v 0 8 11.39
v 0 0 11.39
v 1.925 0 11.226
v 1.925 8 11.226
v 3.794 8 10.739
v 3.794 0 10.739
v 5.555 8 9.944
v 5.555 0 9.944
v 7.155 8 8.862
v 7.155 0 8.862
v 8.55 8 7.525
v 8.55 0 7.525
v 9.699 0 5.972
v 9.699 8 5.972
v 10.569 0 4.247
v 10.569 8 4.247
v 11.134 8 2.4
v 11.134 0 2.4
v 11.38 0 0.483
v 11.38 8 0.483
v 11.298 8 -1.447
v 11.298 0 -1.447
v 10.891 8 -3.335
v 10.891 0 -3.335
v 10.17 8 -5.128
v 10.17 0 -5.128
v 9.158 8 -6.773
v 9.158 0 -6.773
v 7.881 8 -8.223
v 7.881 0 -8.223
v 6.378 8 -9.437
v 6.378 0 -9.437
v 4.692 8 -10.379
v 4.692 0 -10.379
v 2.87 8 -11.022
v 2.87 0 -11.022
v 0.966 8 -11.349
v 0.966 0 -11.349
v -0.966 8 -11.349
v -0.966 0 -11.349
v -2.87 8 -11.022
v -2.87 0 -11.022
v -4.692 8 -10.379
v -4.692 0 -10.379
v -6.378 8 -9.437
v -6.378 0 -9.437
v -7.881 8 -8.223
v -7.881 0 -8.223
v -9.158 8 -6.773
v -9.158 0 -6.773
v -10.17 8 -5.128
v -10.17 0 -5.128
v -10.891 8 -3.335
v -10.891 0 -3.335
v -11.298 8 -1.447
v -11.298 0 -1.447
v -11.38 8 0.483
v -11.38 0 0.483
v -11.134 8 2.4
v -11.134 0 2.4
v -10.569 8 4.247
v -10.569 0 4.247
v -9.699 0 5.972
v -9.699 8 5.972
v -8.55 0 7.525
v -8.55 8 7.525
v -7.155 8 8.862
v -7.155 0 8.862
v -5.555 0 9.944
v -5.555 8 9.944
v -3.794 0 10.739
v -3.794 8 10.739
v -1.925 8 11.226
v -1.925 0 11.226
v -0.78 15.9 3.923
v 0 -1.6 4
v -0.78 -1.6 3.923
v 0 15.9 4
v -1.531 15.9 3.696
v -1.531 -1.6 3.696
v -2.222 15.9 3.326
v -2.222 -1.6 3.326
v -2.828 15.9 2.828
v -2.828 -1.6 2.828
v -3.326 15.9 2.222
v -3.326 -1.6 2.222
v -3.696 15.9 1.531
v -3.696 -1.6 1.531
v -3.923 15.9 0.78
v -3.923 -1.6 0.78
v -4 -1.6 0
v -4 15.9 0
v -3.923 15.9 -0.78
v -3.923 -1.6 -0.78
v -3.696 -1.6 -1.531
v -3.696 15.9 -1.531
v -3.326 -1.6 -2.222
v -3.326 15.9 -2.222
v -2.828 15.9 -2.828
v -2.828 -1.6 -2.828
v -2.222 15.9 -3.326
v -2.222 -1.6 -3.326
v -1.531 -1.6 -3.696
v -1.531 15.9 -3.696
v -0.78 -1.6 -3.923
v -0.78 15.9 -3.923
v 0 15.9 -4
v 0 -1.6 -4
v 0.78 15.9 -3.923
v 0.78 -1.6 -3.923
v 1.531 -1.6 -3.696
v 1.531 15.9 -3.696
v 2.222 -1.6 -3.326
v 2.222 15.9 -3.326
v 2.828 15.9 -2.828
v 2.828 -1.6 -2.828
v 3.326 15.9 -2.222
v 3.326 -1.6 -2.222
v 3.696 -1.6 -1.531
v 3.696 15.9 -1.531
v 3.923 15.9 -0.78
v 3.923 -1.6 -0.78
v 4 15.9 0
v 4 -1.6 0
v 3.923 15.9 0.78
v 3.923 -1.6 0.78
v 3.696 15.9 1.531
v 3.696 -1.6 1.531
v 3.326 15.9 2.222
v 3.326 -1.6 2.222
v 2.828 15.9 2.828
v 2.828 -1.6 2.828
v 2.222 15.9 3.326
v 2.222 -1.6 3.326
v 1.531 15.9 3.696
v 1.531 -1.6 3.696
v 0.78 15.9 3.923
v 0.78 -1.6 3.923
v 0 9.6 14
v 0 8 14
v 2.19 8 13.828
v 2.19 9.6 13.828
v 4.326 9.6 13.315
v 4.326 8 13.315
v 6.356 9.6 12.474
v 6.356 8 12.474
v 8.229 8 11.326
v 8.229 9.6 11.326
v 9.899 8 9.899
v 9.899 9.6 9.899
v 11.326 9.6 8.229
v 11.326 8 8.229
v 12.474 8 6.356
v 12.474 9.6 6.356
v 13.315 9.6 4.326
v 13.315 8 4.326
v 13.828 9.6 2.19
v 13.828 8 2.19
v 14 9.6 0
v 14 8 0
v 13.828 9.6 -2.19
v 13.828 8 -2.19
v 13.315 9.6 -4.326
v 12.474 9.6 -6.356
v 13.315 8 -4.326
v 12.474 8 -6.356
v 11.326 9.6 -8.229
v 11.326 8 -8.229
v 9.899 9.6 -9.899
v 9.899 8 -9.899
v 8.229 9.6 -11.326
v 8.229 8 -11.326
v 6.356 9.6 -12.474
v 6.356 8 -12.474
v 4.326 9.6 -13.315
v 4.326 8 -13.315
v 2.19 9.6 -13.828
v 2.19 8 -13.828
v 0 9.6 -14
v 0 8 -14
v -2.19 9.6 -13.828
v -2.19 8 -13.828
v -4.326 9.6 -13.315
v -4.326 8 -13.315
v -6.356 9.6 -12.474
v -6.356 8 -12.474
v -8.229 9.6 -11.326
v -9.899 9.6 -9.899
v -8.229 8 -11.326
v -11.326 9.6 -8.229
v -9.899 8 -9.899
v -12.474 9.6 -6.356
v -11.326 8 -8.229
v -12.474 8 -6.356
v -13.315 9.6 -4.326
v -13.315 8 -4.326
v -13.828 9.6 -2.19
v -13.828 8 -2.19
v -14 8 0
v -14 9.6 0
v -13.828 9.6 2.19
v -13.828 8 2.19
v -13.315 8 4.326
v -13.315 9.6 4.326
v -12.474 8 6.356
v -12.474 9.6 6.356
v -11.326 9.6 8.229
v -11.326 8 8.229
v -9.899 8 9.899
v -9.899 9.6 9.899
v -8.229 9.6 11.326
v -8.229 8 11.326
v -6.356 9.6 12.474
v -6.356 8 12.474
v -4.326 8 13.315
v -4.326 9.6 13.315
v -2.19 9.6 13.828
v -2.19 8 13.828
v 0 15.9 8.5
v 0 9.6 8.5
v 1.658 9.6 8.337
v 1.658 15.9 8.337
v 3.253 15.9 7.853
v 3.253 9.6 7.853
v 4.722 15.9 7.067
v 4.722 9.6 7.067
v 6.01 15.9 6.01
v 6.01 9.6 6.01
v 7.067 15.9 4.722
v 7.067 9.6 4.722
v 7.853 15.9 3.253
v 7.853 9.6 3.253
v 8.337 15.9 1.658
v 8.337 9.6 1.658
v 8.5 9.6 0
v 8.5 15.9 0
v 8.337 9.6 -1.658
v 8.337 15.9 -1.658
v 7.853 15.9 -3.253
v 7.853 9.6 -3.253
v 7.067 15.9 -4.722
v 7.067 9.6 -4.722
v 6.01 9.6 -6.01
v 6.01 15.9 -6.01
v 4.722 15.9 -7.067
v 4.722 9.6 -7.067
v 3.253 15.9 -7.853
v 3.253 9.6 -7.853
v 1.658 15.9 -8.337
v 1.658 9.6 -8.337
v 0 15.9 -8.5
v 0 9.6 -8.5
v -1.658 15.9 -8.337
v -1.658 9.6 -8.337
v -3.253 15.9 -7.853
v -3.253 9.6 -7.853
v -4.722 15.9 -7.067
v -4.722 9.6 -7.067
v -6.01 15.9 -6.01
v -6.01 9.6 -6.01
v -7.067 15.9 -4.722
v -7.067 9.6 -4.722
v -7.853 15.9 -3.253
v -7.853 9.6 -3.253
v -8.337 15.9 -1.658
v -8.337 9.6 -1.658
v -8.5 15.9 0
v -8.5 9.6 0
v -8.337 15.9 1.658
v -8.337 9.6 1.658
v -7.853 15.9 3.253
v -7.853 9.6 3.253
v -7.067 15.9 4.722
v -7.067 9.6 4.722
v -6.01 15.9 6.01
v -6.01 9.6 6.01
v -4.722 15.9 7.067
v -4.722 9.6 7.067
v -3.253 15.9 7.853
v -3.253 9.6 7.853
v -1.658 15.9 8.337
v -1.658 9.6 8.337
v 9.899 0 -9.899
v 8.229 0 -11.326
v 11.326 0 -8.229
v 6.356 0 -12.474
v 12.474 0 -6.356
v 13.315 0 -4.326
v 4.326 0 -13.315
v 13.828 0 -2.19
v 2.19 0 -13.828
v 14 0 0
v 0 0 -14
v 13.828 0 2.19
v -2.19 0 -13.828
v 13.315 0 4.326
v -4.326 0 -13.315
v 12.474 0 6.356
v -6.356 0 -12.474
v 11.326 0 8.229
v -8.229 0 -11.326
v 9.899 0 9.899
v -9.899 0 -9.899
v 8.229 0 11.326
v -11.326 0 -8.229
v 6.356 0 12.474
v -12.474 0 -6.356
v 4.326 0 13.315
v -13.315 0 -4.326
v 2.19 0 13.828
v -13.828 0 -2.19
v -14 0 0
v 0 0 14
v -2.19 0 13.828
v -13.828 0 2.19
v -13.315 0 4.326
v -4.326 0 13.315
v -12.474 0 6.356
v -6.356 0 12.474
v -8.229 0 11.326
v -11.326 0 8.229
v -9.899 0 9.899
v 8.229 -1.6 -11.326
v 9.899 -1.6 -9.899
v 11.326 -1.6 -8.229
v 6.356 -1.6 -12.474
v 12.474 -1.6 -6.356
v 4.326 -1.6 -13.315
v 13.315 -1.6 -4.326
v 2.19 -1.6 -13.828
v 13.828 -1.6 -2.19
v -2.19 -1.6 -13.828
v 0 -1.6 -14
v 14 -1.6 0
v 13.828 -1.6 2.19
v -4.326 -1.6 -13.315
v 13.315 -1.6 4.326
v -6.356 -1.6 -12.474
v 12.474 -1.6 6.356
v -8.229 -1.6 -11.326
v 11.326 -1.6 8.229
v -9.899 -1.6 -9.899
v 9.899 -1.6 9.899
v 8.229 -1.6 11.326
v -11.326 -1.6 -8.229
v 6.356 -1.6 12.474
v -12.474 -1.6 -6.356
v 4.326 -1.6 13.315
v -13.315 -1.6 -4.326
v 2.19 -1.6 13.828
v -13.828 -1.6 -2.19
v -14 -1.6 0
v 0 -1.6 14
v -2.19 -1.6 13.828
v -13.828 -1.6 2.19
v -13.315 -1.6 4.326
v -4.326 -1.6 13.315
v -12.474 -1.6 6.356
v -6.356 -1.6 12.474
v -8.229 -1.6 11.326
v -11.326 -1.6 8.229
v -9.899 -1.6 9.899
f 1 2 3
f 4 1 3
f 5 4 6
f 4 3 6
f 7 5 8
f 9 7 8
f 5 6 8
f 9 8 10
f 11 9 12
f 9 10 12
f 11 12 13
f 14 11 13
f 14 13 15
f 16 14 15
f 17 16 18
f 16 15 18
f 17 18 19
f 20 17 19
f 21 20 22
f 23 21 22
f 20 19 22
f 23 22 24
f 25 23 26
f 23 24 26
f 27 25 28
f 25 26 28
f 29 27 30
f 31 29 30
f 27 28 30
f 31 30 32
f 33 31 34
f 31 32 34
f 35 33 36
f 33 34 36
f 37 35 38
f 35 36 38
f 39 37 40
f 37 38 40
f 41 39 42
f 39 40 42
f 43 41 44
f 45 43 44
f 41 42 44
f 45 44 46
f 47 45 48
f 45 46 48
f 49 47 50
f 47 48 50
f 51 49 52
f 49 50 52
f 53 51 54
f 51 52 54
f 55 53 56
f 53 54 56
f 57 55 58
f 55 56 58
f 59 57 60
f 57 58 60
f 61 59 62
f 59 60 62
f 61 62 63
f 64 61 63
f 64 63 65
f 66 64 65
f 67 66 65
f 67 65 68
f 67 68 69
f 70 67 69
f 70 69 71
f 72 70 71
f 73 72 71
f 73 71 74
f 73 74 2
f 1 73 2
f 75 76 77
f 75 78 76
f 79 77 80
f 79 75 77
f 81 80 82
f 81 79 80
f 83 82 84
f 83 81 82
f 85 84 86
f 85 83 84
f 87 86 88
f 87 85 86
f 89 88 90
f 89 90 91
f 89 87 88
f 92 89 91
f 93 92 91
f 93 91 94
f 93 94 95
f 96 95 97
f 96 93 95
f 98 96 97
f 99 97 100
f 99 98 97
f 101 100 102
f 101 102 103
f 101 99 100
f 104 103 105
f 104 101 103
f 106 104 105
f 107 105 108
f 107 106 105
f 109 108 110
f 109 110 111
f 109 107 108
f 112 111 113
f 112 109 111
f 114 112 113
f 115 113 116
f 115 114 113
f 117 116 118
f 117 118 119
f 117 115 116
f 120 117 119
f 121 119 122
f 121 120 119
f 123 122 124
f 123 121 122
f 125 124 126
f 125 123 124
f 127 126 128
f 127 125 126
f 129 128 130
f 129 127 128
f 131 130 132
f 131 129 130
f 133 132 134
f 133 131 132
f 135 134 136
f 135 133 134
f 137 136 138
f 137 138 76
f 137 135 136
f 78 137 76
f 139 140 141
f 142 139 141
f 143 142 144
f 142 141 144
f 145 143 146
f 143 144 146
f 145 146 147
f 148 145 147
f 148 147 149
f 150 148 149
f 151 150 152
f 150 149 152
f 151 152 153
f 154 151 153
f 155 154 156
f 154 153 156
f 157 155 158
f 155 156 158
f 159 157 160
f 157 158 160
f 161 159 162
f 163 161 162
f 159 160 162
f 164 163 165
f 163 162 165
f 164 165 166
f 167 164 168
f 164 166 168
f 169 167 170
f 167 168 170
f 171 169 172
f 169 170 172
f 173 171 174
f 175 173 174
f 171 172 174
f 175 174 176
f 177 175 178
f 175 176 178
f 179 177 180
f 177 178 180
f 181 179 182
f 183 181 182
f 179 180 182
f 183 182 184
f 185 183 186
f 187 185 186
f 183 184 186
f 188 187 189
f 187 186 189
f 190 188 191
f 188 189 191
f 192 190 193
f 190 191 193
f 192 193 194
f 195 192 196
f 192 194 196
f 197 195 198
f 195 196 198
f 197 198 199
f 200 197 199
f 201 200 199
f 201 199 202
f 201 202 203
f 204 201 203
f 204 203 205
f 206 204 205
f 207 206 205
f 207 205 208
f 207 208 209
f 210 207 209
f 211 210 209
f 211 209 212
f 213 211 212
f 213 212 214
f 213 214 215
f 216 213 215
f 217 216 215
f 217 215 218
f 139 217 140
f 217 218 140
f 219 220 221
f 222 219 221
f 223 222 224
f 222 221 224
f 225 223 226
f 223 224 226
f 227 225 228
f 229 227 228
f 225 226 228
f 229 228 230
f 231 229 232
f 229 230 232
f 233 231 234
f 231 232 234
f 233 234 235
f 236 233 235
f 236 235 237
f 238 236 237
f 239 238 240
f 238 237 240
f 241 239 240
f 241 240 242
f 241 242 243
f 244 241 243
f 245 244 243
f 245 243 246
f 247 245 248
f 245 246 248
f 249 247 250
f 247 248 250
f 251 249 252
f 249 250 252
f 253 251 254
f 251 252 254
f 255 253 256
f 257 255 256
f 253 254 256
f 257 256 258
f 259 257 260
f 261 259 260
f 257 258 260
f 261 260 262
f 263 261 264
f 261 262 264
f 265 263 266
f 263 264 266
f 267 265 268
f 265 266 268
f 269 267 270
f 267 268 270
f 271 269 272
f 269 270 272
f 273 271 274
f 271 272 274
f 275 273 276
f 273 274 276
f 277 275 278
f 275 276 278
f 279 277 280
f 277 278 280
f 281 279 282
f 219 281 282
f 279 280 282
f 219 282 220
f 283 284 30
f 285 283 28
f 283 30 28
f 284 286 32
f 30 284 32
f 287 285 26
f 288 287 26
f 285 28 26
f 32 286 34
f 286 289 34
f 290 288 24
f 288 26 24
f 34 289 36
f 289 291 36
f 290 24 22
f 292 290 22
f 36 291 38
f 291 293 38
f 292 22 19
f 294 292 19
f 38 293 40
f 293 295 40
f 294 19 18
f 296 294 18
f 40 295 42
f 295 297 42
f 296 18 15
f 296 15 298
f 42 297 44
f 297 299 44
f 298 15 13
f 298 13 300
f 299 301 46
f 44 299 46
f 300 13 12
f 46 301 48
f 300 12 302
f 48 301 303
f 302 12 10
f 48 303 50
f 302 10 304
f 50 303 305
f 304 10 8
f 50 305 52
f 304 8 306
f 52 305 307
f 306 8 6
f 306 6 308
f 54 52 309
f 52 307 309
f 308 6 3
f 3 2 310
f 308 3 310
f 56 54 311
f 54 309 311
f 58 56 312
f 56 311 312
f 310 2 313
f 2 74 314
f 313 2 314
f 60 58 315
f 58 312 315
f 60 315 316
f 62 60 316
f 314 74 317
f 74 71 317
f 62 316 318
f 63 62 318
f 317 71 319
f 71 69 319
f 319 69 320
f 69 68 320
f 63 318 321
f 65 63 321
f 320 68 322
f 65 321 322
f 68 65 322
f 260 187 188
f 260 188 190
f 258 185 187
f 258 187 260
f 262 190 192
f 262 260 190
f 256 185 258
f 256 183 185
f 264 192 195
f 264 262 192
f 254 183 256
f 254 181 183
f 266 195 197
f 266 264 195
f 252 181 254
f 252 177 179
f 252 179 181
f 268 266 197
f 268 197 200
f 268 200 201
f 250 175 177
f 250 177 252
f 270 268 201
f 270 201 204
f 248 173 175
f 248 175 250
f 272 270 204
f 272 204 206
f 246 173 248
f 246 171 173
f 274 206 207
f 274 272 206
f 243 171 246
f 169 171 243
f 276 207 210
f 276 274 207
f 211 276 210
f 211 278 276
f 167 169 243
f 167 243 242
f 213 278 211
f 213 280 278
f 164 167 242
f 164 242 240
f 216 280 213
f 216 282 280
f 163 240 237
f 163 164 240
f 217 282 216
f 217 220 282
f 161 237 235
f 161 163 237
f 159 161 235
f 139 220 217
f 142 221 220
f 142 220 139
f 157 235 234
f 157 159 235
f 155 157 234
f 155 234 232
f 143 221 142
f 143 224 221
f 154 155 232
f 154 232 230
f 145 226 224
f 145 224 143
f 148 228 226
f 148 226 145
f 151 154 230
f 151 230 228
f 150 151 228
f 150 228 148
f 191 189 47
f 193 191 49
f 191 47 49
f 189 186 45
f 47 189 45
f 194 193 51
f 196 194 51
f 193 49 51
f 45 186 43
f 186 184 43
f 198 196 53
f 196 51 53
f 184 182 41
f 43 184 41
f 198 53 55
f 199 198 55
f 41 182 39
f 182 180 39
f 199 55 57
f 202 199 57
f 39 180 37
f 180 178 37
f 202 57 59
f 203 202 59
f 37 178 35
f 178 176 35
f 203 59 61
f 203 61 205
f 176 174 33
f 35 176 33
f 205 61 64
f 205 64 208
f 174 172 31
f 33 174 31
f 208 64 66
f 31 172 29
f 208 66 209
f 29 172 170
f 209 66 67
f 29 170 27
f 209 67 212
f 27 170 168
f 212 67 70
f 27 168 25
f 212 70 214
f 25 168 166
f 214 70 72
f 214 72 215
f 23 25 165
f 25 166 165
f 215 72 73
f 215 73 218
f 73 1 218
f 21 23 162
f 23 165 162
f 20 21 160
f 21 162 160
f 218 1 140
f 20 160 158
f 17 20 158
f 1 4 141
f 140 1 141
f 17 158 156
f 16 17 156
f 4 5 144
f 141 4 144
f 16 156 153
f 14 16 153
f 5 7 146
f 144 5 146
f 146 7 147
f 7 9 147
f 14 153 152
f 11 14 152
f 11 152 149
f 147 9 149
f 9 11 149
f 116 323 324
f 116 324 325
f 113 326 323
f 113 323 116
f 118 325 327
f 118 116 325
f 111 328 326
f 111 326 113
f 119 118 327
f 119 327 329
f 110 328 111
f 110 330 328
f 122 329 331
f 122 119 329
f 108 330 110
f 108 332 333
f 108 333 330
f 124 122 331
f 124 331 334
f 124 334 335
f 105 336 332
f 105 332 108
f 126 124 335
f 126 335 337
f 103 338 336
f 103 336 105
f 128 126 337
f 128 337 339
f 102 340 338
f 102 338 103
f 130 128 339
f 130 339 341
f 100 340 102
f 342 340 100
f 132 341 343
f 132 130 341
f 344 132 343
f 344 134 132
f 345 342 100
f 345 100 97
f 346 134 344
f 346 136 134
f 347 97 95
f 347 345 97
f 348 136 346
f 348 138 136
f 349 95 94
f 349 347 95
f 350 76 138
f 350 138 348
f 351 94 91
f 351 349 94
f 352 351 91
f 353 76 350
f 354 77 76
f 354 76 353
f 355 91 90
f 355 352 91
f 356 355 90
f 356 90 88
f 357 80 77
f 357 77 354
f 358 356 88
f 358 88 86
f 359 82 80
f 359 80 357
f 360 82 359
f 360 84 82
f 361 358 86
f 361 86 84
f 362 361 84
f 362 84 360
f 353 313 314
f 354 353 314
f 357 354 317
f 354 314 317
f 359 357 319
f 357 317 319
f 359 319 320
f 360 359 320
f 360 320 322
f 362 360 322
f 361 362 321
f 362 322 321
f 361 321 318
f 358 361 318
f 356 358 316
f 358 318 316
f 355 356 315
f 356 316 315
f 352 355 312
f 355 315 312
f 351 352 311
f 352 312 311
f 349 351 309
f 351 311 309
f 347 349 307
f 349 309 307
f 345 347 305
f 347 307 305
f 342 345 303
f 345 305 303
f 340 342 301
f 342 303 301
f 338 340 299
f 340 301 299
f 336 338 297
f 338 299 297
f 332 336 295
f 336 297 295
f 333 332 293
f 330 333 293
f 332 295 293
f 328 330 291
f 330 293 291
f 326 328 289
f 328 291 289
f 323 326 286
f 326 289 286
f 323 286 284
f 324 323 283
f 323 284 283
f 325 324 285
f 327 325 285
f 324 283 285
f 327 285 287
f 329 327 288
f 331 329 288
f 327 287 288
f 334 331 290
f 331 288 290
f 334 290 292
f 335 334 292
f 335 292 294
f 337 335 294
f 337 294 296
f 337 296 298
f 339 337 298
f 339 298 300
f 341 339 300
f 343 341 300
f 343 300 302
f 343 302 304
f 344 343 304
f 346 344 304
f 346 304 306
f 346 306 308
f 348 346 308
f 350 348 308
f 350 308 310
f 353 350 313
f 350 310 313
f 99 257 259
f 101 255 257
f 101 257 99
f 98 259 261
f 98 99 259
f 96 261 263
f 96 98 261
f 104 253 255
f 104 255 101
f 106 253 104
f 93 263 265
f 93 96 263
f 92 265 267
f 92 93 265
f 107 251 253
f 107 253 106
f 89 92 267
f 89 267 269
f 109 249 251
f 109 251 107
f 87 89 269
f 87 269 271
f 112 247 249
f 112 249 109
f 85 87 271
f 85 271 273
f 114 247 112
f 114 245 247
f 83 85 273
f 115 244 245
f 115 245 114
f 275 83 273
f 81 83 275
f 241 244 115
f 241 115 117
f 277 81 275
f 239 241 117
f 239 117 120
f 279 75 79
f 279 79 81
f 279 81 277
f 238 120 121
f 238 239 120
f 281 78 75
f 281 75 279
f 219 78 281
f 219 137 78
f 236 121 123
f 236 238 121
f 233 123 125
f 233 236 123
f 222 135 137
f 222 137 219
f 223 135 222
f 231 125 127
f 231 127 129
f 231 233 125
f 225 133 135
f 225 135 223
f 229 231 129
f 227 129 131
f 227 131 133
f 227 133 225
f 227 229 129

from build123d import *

# Parameters (mm, degrees)
SKETCH1_R               = 11.39
BOSS_EXTRUDE1_DEPTH     = 8
SKETCH2_R               = 14
BOSS_EXTRUDE2_DEPTH     = 1.6
SKETCH3_R               = 8.5
BOSS_EXTRUDE3_DEPTH     = 6.3
CUT_EXTRUDE1_DEPTH      = 26.393109302
CUT_EXTRUDE1_DEPTH_BACK = 26.393109302
SKETCH4_R               = 4
SKETCH5_R               = 14
SKETCH5_R_2             = 4
BOSS_EXTRUDE4_DEPTH     = 1.6


with BuildPart() as part:
    # Sketch1 → Boss-Extrude1 (new body)
    with BuildSketch(Plane(origin=(0, 0, 0), x_dir=(1, 0, 0), z_dir=(0, 1, 0))):
        with Locations(Location((0, 0, 0), (0, 0, 270))):
            Circle(SKETCH1_R)
    extrude(amount=BOSS_EXTRUDE1_DEPTH)

    # Sketch2 → Boss-Extrude2 (add)
    with BuildSketch(Plane(origin=(0, 8, 0), x_dir=(1, 0, 0), z_dir=(0, 1, 0))):
        with Locations(Location((0, 0, 0), (0, 0, 270))):
            Circle(SKETCH2_R)
    extrude(amount=BOSS_EXTRUDE2_DEPTH)

    # Sketch3 → Boss-Extrude3 (add)
    with BuildSketch(Plane(origin=(0, 9.6, 0), x_dir=(1, 0, 0), z_dir=(0, 1, 0))):
        with Locations(Location((0, 0, 0), (0, 0, 270))):
            Circle(SKETCH3_R)
    extrude(amount=BOSS_EXTRUDE3_DEPTH)

    # Sketch4 → Cut-Extrude1 (cut, two sides: drawn at the far end of the back side and taken through both)
    with BuildSketch(Plane(origin=(0, 15.9, 0), x_dir=(1, 0, 0), z_dir=(0, 1, 0)).offset(-CUT_EXTRUDE1_DEPTH_BACK)):
        with Locations(Location((0, 0, 0), (0, 0, 270))):
            Circle(SKETCH4_R)
    extrude(amount=CUT_EXTRUDE1_DEPTH + CUT_EXTRUDE1_DEPTH_BACK, mode=Mode.SUBTRACT)

    # Sketch5 → Boss-Extrude4 (add)
    with BuildSketch(Plane.XZ):
        with Locations(Location((0, 0, 0), (0, 0, 90))):
            Circle(SKETCH5_R)
        with Locations(Location((0, 0, 0), (0, 0, 90))):
            Circle(SKETCH5_R_2, mode=Mode.SUBTRACT)
    extrude(amount=BOSS_EXTRUDE4_DEPTH)


solid = part.part
